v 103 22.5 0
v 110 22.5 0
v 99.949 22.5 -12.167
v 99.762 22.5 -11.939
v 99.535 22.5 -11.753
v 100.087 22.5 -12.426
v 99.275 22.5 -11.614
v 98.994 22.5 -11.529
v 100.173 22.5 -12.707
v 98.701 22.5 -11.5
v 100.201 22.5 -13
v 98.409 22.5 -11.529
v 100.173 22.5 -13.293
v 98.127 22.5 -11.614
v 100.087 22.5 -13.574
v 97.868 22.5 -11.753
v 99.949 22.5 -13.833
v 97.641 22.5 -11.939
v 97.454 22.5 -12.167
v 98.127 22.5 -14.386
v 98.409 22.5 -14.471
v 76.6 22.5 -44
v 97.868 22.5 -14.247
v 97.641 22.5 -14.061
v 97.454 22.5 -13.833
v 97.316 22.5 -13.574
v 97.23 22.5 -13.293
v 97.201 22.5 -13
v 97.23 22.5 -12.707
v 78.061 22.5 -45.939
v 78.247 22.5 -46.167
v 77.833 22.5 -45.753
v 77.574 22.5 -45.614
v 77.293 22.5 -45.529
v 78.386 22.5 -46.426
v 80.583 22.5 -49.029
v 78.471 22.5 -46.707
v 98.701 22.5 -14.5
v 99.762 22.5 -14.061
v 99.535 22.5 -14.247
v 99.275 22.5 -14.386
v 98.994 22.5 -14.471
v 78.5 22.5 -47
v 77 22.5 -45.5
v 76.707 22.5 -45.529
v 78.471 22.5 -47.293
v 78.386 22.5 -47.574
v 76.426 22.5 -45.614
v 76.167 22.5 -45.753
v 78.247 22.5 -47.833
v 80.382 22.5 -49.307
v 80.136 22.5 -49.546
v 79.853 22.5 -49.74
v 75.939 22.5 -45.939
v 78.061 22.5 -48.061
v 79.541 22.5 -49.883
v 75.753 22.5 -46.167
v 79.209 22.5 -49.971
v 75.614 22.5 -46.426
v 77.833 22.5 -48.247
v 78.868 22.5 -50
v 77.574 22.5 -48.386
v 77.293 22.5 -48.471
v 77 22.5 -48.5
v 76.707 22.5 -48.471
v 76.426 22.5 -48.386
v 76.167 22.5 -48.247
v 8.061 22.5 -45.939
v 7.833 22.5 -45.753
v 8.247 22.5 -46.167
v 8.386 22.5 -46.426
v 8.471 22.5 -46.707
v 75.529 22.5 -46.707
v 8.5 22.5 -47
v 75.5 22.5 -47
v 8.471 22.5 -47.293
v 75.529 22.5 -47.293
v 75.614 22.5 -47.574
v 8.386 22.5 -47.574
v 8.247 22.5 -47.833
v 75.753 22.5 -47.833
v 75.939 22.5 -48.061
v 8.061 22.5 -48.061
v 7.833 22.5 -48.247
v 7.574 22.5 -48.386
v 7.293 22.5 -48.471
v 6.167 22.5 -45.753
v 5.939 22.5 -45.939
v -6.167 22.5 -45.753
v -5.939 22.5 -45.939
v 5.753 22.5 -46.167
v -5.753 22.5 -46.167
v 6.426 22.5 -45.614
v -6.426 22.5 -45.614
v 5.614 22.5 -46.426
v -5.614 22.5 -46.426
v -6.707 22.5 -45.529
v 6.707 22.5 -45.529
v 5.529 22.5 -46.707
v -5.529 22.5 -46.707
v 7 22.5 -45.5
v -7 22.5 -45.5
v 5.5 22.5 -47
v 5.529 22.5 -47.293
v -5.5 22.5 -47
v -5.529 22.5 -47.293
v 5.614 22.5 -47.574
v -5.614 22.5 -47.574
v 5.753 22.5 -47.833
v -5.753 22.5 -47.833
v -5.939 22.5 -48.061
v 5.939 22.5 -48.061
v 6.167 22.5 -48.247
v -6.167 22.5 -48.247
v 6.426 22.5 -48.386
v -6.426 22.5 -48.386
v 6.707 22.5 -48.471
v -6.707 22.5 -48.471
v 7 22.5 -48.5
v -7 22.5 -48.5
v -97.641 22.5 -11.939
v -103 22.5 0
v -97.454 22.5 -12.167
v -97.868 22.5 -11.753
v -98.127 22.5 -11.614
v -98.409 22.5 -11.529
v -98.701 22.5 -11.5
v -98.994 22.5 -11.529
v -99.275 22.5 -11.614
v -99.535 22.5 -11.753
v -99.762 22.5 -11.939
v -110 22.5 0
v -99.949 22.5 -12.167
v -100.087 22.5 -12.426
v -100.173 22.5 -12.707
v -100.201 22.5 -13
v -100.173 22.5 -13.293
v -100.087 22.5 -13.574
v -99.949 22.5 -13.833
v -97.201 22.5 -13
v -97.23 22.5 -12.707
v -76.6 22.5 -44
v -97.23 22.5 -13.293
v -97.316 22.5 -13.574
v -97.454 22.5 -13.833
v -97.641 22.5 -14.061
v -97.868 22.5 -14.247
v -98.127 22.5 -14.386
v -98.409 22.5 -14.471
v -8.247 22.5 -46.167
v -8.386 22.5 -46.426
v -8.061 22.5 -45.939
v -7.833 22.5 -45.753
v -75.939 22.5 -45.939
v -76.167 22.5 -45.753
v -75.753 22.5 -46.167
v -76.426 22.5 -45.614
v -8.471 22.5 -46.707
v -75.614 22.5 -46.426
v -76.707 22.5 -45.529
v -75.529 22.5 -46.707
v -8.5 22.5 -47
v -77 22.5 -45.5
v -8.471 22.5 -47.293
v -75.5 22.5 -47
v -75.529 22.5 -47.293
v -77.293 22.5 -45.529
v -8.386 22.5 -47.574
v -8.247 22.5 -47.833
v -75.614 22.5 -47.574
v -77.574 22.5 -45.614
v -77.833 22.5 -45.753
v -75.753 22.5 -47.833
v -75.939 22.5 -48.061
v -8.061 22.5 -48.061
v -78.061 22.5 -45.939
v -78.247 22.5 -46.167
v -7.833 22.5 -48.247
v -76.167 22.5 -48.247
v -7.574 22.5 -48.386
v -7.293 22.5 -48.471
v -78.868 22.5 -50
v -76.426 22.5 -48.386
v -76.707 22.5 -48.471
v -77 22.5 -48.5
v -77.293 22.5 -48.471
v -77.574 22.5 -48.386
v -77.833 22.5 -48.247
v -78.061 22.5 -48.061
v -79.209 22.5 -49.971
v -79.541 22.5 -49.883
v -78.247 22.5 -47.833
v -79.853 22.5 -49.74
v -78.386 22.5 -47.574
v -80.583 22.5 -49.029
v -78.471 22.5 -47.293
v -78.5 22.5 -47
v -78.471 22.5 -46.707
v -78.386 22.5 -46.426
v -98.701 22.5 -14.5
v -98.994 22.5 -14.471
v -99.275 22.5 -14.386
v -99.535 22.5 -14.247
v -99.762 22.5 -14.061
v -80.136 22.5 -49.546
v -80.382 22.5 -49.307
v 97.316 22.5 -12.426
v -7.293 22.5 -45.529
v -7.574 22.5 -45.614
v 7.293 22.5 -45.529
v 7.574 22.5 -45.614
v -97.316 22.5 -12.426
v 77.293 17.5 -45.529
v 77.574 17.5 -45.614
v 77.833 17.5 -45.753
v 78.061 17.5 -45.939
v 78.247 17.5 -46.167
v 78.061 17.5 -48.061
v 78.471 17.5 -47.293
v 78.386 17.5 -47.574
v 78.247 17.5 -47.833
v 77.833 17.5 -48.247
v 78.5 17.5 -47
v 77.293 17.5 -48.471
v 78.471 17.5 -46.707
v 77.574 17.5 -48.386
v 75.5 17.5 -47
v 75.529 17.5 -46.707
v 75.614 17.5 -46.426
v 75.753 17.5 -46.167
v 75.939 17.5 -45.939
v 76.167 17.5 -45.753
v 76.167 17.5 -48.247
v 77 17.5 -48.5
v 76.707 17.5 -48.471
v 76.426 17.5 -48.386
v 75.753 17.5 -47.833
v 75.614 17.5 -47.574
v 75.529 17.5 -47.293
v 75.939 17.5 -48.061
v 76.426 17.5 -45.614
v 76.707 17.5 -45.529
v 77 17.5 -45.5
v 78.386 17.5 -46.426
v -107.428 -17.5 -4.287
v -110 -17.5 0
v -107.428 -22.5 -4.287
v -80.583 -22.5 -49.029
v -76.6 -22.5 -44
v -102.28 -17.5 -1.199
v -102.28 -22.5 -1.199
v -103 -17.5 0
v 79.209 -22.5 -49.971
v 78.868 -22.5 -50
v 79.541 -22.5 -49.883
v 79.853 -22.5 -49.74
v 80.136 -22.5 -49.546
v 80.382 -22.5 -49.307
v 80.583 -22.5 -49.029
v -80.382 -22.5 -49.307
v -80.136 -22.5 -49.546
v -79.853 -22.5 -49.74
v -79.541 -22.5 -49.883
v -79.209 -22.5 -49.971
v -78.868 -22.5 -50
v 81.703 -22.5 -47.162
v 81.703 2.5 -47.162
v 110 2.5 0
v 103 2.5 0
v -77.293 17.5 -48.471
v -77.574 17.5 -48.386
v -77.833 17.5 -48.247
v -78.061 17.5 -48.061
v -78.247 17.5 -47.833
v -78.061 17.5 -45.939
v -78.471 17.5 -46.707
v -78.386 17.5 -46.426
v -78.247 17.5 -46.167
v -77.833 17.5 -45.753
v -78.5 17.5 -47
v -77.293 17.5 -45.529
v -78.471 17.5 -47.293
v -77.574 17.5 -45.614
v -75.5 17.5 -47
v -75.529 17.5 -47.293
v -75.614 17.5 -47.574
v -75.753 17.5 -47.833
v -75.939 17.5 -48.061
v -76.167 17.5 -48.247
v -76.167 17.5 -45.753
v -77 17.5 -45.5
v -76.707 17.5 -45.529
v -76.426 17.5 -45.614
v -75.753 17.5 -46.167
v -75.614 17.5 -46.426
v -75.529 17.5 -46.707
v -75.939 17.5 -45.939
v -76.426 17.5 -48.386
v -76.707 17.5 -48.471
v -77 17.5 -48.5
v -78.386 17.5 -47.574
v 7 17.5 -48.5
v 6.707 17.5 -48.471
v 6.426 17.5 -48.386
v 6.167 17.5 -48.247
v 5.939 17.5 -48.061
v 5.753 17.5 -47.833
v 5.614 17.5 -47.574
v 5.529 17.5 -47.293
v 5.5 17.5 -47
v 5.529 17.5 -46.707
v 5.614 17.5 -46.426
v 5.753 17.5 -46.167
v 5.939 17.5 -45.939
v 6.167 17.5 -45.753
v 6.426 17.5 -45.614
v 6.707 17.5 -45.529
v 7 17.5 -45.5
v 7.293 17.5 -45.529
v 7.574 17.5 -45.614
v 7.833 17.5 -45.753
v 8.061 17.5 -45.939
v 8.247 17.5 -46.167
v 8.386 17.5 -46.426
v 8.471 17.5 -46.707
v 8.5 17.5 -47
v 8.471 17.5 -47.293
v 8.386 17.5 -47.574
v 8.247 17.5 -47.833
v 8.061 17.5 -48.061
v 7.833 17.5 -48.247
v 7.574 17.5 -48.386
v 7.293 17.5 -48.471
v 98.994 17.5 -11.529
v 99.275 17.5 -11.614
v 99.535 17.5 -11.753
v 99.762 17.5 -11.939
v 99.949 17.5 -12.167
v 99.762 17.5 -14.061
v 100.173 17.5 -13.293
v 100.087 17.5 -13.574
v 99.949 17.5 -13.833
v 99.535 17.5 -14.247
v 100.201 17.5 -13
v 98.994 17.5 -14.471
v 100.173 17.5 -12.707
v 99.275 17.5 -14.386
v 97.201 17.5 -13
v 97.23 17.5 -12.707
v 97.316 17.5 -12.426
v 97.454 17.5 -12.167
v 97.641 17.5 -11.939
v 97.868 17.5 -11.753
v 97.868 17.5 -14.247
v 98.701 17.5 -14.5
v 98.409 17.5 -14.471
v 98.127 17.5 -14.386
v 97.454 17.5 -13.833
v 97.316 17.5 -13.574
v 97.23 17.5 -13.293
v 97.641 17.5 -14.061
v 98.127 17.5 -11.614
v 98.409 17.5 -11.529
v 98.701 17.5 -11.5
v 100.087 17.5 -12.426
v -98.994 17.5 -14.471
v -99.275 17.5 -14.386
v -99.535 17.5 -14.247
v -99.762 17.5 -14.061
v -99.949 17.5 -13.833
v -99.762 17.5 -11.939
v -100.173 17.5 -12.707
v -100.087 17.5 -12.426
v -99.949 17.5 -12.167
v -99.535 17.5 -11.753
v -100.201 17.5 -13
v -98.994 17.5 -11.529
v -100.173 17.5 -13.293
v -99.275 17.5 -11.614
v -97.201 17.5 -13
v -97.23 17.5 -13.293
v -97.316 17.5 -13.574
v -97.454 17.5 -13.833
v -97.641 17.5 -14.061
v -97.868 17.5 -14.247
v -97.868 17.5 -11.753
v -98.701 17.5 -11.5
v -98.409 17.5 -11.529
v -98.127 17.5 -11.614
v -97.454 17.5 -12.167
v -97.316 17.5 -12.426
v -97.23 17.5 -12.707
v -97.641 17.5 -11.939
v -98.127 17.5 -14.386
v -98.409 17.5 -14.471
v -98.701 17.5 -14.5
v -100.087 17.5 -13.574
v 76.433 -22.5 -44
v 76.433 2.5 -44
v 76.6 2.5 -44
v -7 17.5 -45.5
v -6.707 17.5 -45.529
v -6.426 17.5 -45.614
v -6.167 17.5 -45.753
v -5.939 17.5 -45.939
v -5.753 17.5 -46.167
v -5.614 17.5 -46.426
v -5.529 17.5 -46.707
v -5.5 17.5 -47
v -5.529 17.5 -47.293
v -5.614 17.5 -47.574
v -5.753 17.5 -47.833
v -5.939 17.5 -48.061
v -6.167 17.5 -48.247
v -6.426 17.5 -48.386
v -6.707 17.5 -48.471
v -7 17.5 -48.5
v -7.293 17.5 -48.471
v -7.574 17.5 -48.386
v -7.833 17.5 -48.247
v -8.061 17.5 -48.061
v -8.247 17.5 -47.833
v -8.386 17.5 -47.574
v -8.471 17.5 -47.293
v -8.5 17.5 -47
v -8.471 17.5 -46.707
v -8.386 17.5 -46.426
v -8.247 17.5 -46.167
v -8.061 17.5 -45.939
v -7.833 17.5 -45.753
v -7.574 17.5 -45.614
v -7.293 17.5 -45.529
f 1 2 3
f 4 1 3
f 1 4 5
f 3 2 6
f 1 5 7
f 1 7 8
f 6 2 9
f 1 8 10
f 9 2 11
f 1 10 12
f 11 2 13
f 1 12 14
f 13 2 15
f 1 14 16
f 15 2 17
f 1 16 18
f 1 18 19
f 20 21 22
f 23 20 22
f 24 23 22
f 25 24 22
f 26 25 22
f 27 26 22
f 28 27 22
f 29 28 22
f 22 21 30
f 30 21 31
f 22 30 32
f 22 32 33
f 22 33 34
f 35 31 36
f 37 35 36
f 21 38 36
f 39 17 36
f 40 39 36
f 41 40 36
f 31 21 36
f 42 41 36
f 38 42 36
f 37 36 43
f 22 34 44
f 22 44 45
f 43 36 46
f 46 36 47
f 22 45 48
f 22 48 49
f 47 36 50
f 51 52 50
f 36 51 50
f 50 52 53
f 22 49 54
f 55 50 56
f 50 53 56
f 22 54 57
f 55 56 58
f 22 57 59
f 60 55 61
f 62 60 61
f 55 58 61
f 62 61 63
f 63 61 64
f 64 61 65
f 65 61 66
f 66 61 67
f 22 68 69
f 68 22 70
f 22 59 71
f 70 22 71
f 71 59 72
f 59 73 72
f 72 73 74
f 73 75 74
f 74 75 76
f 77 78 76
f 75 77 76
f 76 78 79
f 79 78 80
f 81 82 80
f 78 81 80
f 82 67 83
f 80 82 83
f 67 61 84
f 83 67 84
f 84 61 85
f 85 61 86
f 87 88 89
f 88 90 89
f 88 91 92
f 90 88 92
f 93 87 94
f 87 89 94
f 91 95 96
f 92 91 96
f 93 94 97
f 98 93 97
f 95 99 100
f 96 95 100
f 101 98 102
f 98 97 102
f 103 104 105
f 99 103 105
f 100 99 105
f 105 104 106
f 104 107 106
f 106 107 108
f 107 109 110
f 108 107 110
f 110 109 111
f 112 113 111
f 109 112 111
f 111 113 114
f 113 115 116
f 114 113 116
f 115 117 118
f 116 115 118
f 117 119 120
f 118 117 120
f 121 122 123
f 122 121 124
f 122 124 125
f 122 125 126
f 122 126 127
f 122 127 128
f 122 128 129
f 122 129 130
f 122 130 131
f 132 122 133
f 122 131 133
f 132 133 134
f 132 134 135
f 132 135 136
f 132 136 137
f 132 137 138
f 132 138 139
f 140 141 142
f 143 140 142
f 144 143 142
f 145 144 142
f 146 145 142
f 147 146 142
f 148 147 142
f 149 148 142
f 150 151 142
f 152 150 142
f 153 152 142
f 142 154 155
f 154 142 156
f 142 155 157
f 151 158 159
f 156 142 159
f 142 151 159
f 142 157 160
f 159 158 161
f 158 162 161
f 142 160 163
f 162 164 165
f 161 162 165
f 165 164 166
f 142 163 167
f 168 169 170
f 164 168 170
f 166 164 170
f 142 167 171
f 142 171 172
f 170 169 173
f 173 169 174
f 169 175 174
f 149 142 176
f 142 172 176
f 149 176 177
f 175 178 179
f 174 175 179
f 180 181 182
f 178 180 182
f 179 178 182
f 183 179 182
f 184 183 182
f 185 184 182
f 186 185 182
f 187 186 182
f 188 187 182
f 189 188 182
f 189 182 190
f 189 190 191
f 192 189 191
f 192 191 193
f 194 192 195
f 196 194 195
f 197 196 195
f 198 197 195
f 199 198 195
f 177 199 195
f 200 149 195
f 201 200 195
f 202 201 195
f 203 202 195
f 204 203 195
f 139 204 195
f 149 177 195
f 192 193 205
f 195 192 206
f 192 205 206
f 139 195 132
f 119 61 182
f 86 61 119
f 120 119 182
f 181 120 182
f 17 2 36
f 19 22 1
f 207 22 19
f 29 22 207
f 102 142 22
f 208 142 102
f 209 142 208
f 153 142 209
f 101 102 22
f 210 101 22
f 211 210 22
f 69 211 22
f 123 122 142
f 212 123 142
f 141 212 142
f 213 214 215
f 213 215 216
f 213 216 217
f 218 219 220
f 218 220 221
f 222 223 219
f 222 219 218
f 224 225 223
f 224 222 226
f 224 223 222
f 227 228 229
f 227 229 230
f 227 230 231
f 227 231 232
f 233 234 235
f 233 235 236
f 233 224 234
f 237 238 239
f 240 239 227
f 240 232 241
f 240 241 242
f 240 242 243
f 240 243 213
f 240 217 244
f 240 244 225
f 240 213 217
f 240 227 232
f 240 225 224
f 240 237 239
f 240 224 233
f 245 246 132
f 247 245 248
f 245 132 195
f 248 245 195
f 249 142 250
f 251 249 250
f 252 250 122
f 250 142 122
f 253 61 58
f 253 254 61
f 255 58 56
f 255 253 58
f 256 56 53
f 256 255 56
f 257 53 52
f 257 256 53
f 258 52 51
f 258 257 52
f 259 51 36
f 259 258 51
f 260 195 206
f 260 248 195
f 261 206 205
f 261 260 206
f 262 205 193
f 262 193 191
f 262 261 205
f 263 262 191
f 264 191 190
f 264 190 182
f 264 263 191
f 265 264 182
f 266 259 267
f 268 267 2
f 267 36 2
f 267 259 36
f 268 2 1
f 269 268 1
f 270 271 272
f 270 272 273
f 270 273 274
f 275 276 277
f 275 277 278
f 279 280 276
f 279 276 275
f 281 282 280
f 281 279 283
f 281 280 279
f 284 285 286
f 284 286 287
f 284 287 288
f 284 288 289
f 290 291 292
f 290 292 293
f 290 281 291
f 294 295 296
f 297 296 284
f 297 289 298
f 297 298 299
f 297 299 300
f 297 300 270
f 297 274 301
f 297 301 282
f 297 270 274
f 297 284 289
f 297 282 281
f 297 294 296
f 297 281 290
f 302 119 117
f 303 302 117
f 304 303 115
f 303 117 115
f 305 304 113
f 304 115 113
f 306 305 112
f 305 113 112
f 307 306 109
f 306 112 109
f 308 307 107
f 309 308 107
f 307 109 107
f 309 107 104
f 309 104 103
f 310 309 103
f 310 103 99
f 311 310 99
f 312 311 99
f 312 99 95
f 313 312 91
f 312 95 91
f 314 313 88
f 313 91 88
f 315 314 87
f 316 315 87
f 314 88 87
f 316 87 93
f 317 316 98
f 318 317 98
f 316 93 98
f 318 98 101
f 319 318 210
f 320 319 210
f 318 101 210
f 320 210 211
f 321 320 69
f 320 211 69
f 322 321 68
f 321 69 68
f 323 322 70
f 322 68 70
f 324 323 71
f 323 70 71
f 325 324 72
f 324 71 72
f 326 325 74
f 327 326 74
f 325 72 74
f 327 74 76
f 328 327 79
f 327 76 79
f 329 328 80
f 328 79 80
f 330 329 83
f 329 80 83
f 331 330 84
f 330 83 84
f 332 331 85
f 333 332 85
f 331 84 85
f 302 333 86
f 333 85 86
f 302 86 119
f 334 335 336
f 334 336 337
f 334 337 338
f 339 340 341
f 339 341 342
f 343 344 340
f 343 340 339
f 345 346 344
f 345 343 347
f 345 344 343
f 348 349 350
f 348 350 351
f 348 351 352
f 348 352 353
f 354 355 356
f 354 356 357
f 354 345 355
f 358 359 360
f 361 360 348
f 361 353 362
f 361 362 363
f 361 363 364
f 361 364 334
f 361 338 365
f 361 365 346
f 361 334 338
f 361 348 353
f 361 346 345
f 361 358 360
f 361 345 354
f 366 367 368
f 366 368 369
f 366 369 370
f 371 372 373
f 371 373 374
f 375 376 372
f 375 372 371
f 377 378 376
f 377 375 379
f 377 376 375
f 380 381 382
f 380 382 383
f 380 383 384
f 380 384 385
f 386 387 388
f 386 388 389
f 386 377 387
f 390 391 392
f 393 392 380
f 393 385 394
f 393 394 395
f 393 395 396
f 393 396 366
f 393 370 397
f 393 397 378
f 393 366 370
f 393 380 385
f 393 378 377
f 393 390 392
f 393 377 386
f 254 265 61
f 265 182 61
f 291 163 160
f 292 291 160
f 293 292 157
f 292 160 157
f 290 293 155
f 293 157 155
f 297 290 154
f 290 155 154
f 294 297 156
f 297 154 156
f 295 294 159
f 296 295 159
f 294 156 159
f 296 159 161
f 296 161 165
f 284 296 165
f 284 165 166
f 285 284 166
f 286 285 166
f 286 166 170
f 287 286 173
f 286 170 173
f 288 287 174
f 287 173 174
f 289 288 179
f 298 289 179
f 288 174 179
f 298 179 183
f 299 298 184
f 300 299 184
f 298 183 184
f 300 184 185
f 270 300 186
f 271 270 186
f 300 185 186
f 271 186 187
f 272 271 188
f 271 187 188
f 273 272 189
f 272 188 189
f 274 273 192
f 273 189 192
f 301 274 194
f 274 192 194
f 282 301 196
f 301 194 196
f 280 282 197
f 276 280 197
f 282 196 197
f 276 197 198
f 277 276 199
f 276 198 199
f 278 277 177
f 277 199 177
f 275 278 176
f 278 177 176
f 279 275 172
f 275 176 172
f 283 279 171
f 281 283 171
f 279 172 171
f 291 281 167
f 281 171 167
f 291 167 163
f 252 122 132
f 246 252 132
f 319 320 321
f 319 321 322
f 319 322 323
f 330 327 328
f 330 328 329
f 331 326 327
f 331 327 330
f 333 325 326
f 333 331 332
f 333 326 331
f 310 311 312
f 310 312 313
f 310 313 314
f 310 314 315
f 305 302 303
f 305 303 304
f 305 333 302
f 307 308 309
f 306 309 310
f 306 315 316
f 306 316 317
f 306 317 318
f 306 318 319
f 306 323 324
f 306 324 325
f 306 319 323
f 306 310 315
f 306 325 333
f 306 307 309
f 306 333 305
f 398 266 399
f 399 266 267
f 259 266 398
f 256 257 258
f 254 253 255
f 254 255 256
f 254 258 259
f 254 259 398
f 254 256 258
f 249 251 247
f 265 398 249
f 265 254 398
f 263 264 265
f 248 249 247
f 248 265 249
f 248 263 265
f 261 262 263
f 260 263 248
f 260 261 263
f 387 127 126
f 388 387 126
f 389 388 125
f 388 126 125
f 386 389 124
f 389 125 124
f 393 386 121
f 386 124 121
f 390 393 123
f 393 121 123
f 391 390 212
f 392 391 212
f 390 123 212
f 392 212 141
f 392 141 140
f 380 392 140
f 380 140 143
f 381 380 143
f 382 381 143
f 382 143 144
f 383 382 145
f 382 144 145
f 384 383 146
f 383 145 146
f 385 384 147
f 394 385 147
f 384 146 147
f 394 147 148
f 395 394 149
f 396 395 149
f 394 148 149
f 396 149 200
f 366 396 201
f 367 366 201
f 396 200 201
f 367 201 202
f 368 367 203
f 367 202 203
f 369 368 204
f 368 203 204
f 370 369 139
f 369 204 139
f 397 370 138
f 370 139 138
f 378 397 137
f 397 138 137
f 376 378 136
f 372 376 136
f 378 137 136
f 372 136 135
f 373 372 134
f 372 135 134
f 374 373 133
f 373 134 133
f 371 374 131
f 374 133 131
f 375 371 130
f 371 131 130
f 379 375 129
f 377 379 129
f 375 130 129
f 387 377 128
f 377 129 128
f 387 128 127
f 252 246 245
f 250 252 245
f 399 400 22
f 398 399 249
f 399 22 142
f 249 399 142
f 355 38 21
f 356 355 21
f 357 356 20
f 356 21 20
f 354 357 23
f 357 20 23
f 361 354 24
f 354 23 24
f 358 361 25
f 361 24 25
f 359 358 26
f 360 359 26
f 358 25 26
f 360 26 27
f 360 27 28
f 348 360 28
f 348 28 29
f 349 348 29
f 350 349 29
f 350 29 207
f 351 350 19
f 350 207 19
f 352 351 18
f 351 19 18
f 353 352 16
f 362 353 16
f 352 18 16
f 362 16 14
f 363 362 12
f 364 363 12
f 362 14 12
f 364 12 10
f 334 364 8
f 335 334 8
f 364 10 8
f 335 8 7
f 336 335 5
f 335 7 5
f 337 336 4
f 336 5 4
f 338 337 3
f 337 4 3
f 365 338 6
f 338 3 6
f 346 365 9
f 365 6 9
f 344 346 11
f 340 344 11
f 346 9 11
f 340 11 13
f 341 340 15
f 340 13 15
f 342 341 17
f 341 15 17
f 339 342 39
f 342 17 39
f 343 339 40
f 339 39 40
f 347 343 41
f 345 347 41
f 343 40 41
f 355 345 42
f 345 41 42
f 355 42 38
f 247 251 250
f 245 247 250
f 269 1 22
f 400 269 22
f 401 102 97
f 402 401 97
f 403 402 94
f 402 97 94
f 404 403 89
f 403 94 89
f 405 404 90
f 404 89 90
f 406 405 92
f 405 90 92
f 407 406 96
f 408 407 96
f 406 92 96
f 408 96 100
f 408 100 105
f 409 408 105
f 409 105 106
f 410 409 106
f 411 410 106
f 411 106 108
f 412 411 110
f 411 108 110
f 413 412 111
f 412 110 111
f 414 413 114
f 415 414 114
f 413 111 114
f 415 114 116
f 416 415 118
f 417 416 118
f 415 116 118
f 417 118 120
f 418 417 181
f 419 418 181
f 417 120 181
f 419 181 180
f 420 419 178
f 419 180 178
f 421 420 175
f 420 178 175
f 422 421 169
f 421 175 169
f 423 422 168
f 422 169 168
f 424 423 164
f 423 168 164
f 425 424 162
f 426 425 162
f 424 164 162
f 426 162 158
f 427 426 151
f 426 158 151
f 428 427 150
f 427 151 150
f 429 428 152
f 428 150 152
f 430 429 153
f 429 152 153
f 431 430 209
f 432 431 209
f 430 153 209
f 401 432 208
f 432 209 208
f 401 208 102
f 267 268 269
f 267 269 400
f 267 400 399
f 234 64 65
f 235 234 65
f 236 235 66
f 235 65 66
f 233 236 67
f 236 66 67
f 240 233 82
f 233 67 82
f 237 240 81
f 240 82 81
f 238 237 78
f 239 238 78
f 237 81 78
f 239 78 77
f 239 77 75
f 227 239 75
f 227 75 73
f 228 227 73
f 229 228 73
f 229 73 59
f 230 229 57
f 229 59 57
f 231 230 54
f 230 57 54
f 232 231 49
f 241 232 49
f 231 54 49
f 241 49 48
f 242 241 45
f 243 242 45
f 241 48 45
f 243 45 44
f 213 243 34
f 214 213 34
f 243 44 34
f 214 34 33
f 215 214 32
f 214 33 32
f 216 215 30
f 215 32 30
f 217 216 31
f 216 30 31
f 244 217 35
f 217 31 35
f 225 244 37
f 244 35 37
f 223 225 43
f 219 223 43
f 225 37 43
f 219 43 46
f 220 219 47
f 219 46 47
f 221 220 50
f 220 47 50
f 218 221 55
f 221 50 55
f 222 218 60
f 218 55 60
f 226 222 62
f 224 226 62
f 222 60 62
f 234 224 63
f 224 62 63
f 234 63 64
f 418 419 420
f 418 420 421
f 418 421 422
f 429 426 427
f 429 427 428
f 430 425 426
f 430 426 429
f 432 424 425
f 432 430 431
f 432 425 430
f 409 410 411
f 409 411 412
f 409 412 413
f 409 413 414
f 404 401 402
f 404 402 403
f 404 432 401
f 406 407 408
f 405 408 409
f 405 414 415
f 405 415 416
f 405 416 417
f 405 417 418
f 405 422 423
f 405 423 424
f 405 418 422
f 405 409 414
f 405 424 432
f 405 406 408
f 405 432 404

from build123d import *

# Parameters (mm, degrees)
BOSS_EXTRUDE1_DEPTH = 22.5
SKETCH2_R           = 1.5
CUT_EXTRUDE1_DEPTH  = 5
FILLET1_R           = 2
SKETCH4_W           = 55
SKETCH4_H           = 25
CUT_EXTRUDE3_DEPTH  = 10
SKETCH5_W           = 5
SKETCH5_H           = 5
CUT_EXTRUDE4_DEPTH  = 10


with BuildPart() as part:
    # Sketch1 → Boss-Extrude1 (new, symmetric)
    with BuildSketch(Plane(origin=(0, 0, 0), x_dir=(1, 0, 0), z_dir=(0, 1, 0))):
        Polygon((-110, 0), (-80, 50), (80, 50), (110, 0), (103, 0), (76.6, 44), (-76.6, 44), (-103, 0), align=None)
    extrude(amount=BOSS_EXTRUDE1_DEPTH, both=True)

    # Sketch2 → Cut-Extrude1 (cut)
    with BuildSketch(Plane(origin=(0, 22.5, 0), x_dir=(1, 0, 0), z_dir=(0, 1, 0))):
        with Locations(Location((-98.701428863, 13, 0), (0, 0, 270))):
            Circle(SKETCH2_R)
        with Locations(Location((-77, 47, 0), (0, 0, 270))):
            Circle(SKETCH2_R)
        with Locations(Location((-7, 47, 0), (0, 0, 270))):
            Circle(SKETCH2_R)
        with Locations(Location((7, 47, 0), (0, 0, 90))):
            Circle(SKETCH2_R)
        with Locations(Location((77, 47, 0), (0, 0, 90))):
            Circle(SKETCH2_R)
        with Locations(Location((98.701428863, 13, 0), (0, 0, 90))):
            Circle(SKETCH2_R)
    extrude(amount=-CUT_EXTRUDE1_DEPTH, mode=Mode.SUBTRACT)

    # Fillet1
    fillet1_edges = [part.edges().sort_by_distance(p)[0] for p in [
        (-80, 0, -50),
        (80, 0, -50),
    ]]
    fillet(fillet1_edges, radius=FILLET1_R)

    # Sketch4 → Cut-Extrude3 (cut)
    with BuildSketch(Plane(origin=(80.882352941, 0, -48.529411765), x_dir=(-0.5144957554275265, 0, -0.8574929257125443), z_dir=(0.8574929257125443, 0, -0.5144957554275265))):
        with Locations((-29.094533097, -10)):
            Rectangle(SKETCH4_W, SKETCH4_H)
    extrude(amount=-CUT_EXTRUDE3_DEPTH, mode=Mode.SUBTRACT)

    # Sketch5 → Cut-Extrude4 (cut)
    with BuildSketch(Plane(origin=(-75.735294118, 0, -45.441176471), x_dir=(0.5144957554275261, 0, -0.8574929257125445), z_dir=(0.8574929257125444, 0, 0.514495755427526))):
        with Locations((-54.094533097, -20)):
            Rectangle(SKETCH5_W, SKETCH5_H)
    extrude(amount=-CUT_EXTRUDE4_DEPTH, mode=Mode.SUBTRACT)


solid = part.part
